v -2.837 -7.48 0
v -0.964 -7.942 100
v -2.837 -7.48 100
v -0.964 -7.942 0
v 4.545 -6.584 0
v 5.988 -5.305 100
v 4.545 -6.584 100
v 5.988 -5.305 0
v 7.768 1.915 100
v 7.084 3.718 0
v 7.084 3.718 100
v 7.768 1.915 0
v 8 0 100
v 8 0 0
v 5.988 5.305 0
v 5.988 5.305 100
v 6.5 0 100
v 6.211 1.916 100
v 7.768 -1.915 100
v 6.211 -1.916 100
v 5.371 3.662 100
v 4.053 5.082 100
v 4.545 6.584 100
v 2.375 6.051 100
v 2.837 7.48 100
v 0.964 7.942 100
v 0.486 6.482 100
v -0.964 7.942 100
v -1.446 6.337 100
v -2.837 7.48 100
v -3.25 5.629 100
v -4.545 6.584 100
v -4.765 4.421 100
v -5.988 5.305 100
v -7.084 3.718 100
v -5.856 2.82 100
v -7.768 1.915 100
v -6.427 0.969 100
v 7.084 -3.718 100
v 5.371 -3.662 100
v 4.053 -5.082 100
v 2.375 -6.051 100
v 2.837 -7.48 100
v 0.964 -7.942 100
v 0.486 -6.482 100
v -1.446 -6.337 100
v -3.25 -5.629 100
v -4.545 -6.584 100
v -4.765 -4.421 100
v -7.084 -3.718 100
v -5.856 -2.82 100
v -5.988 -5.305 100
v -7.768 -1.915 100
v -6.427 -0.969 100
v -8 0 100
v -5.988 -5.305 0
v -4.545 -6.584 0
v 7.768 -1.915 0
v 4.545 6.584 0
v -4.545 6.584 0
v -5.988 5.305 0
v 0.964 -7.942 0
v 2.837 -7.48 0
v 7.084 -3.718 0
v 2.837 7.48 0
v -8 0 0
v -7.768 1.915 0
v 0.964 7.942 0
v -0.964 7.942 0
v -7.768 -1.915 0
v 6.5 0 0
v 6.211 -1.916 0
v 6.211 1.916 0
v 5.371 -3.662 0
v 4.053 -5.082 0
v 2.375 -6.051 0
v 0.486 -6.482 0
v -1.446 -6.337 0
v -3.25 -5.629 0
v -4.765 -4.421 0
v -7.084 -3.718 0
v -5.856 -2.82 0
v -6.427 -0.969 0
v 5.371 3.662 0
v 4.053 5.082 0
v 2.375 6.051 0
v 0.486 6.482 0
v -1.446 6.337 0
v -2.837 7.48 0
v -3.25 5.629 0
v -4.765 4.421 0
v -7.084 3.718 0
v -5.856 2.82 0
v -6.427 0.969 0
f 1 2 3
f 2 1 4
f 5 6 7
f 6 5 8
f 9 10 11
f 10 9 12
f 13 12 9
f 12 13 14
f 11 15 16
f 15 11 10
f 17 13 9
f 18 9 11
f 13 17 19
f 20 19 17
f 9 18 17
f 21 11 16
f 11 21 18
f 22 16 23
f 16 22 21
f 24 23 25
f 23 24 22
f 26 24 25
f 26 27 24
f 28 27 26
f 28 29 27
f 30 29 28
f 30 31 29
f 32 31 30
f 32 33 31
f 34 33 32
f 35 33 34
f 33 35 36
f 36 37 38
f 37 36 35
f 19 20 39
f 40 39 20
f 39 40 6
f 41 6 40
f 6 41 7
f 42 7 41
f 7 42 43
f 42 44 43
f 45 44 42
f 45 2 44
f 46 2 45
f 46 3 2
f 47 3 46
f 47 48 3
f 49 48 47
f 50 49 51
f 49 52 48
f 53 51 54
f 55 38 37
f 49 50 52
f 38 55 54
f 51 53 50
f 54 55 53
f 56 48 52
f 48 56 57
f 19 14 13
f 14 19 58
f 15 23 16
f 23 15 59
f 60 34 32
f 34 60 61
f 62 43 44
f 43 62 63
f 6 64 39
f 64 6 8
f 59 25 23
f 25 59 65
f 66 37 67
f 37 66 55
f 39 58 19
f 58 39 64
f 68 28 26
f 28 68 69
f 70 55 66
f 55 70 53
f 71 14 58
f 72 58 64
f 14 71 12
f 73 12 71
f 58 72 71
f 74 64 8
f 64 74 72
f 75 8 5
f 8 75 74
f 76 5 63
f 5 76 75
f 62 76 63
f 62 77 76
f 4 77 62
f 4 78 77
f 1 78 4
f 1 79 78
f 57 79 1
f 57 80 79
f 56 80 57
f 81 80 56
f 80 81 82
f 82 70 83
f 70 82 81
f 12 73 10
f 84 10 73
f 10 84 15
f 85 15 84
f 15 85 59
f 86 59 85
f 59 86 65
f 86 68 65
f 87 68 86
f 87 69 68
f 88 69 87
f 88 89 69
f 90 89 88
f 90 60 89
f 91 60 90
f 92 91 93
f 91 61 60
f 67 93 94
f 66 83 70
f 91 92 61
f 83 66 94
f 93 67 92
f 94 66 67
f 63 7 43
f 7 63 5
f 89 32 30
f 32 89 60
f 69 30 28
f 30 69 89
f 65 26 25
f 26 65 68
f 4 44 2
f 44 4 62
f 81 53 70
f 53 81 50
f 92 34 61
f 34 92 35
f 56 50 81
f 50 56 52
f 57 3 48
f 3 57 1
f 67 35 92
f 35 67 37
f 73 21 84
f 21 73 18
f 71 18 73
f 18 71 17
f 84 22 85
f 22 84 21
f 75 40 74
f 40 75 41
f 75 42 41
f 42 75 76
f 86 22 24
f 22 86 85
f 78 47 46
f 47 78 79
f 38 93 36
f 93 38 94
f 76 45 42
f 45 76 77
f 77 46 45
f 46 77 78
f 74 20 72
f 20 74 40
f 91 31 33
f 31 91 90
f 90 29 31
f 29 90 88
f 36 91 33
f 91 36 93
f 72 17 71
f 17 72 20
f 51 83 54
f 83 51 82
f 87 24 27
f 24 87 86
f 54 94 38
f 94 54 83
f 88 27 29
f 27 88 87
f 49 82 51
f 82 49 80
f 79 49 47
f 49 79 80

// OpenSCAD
difference() {
    cylinder(h = 100, r = 8);
    cylinder(h = 100, r = 6.5);
}
